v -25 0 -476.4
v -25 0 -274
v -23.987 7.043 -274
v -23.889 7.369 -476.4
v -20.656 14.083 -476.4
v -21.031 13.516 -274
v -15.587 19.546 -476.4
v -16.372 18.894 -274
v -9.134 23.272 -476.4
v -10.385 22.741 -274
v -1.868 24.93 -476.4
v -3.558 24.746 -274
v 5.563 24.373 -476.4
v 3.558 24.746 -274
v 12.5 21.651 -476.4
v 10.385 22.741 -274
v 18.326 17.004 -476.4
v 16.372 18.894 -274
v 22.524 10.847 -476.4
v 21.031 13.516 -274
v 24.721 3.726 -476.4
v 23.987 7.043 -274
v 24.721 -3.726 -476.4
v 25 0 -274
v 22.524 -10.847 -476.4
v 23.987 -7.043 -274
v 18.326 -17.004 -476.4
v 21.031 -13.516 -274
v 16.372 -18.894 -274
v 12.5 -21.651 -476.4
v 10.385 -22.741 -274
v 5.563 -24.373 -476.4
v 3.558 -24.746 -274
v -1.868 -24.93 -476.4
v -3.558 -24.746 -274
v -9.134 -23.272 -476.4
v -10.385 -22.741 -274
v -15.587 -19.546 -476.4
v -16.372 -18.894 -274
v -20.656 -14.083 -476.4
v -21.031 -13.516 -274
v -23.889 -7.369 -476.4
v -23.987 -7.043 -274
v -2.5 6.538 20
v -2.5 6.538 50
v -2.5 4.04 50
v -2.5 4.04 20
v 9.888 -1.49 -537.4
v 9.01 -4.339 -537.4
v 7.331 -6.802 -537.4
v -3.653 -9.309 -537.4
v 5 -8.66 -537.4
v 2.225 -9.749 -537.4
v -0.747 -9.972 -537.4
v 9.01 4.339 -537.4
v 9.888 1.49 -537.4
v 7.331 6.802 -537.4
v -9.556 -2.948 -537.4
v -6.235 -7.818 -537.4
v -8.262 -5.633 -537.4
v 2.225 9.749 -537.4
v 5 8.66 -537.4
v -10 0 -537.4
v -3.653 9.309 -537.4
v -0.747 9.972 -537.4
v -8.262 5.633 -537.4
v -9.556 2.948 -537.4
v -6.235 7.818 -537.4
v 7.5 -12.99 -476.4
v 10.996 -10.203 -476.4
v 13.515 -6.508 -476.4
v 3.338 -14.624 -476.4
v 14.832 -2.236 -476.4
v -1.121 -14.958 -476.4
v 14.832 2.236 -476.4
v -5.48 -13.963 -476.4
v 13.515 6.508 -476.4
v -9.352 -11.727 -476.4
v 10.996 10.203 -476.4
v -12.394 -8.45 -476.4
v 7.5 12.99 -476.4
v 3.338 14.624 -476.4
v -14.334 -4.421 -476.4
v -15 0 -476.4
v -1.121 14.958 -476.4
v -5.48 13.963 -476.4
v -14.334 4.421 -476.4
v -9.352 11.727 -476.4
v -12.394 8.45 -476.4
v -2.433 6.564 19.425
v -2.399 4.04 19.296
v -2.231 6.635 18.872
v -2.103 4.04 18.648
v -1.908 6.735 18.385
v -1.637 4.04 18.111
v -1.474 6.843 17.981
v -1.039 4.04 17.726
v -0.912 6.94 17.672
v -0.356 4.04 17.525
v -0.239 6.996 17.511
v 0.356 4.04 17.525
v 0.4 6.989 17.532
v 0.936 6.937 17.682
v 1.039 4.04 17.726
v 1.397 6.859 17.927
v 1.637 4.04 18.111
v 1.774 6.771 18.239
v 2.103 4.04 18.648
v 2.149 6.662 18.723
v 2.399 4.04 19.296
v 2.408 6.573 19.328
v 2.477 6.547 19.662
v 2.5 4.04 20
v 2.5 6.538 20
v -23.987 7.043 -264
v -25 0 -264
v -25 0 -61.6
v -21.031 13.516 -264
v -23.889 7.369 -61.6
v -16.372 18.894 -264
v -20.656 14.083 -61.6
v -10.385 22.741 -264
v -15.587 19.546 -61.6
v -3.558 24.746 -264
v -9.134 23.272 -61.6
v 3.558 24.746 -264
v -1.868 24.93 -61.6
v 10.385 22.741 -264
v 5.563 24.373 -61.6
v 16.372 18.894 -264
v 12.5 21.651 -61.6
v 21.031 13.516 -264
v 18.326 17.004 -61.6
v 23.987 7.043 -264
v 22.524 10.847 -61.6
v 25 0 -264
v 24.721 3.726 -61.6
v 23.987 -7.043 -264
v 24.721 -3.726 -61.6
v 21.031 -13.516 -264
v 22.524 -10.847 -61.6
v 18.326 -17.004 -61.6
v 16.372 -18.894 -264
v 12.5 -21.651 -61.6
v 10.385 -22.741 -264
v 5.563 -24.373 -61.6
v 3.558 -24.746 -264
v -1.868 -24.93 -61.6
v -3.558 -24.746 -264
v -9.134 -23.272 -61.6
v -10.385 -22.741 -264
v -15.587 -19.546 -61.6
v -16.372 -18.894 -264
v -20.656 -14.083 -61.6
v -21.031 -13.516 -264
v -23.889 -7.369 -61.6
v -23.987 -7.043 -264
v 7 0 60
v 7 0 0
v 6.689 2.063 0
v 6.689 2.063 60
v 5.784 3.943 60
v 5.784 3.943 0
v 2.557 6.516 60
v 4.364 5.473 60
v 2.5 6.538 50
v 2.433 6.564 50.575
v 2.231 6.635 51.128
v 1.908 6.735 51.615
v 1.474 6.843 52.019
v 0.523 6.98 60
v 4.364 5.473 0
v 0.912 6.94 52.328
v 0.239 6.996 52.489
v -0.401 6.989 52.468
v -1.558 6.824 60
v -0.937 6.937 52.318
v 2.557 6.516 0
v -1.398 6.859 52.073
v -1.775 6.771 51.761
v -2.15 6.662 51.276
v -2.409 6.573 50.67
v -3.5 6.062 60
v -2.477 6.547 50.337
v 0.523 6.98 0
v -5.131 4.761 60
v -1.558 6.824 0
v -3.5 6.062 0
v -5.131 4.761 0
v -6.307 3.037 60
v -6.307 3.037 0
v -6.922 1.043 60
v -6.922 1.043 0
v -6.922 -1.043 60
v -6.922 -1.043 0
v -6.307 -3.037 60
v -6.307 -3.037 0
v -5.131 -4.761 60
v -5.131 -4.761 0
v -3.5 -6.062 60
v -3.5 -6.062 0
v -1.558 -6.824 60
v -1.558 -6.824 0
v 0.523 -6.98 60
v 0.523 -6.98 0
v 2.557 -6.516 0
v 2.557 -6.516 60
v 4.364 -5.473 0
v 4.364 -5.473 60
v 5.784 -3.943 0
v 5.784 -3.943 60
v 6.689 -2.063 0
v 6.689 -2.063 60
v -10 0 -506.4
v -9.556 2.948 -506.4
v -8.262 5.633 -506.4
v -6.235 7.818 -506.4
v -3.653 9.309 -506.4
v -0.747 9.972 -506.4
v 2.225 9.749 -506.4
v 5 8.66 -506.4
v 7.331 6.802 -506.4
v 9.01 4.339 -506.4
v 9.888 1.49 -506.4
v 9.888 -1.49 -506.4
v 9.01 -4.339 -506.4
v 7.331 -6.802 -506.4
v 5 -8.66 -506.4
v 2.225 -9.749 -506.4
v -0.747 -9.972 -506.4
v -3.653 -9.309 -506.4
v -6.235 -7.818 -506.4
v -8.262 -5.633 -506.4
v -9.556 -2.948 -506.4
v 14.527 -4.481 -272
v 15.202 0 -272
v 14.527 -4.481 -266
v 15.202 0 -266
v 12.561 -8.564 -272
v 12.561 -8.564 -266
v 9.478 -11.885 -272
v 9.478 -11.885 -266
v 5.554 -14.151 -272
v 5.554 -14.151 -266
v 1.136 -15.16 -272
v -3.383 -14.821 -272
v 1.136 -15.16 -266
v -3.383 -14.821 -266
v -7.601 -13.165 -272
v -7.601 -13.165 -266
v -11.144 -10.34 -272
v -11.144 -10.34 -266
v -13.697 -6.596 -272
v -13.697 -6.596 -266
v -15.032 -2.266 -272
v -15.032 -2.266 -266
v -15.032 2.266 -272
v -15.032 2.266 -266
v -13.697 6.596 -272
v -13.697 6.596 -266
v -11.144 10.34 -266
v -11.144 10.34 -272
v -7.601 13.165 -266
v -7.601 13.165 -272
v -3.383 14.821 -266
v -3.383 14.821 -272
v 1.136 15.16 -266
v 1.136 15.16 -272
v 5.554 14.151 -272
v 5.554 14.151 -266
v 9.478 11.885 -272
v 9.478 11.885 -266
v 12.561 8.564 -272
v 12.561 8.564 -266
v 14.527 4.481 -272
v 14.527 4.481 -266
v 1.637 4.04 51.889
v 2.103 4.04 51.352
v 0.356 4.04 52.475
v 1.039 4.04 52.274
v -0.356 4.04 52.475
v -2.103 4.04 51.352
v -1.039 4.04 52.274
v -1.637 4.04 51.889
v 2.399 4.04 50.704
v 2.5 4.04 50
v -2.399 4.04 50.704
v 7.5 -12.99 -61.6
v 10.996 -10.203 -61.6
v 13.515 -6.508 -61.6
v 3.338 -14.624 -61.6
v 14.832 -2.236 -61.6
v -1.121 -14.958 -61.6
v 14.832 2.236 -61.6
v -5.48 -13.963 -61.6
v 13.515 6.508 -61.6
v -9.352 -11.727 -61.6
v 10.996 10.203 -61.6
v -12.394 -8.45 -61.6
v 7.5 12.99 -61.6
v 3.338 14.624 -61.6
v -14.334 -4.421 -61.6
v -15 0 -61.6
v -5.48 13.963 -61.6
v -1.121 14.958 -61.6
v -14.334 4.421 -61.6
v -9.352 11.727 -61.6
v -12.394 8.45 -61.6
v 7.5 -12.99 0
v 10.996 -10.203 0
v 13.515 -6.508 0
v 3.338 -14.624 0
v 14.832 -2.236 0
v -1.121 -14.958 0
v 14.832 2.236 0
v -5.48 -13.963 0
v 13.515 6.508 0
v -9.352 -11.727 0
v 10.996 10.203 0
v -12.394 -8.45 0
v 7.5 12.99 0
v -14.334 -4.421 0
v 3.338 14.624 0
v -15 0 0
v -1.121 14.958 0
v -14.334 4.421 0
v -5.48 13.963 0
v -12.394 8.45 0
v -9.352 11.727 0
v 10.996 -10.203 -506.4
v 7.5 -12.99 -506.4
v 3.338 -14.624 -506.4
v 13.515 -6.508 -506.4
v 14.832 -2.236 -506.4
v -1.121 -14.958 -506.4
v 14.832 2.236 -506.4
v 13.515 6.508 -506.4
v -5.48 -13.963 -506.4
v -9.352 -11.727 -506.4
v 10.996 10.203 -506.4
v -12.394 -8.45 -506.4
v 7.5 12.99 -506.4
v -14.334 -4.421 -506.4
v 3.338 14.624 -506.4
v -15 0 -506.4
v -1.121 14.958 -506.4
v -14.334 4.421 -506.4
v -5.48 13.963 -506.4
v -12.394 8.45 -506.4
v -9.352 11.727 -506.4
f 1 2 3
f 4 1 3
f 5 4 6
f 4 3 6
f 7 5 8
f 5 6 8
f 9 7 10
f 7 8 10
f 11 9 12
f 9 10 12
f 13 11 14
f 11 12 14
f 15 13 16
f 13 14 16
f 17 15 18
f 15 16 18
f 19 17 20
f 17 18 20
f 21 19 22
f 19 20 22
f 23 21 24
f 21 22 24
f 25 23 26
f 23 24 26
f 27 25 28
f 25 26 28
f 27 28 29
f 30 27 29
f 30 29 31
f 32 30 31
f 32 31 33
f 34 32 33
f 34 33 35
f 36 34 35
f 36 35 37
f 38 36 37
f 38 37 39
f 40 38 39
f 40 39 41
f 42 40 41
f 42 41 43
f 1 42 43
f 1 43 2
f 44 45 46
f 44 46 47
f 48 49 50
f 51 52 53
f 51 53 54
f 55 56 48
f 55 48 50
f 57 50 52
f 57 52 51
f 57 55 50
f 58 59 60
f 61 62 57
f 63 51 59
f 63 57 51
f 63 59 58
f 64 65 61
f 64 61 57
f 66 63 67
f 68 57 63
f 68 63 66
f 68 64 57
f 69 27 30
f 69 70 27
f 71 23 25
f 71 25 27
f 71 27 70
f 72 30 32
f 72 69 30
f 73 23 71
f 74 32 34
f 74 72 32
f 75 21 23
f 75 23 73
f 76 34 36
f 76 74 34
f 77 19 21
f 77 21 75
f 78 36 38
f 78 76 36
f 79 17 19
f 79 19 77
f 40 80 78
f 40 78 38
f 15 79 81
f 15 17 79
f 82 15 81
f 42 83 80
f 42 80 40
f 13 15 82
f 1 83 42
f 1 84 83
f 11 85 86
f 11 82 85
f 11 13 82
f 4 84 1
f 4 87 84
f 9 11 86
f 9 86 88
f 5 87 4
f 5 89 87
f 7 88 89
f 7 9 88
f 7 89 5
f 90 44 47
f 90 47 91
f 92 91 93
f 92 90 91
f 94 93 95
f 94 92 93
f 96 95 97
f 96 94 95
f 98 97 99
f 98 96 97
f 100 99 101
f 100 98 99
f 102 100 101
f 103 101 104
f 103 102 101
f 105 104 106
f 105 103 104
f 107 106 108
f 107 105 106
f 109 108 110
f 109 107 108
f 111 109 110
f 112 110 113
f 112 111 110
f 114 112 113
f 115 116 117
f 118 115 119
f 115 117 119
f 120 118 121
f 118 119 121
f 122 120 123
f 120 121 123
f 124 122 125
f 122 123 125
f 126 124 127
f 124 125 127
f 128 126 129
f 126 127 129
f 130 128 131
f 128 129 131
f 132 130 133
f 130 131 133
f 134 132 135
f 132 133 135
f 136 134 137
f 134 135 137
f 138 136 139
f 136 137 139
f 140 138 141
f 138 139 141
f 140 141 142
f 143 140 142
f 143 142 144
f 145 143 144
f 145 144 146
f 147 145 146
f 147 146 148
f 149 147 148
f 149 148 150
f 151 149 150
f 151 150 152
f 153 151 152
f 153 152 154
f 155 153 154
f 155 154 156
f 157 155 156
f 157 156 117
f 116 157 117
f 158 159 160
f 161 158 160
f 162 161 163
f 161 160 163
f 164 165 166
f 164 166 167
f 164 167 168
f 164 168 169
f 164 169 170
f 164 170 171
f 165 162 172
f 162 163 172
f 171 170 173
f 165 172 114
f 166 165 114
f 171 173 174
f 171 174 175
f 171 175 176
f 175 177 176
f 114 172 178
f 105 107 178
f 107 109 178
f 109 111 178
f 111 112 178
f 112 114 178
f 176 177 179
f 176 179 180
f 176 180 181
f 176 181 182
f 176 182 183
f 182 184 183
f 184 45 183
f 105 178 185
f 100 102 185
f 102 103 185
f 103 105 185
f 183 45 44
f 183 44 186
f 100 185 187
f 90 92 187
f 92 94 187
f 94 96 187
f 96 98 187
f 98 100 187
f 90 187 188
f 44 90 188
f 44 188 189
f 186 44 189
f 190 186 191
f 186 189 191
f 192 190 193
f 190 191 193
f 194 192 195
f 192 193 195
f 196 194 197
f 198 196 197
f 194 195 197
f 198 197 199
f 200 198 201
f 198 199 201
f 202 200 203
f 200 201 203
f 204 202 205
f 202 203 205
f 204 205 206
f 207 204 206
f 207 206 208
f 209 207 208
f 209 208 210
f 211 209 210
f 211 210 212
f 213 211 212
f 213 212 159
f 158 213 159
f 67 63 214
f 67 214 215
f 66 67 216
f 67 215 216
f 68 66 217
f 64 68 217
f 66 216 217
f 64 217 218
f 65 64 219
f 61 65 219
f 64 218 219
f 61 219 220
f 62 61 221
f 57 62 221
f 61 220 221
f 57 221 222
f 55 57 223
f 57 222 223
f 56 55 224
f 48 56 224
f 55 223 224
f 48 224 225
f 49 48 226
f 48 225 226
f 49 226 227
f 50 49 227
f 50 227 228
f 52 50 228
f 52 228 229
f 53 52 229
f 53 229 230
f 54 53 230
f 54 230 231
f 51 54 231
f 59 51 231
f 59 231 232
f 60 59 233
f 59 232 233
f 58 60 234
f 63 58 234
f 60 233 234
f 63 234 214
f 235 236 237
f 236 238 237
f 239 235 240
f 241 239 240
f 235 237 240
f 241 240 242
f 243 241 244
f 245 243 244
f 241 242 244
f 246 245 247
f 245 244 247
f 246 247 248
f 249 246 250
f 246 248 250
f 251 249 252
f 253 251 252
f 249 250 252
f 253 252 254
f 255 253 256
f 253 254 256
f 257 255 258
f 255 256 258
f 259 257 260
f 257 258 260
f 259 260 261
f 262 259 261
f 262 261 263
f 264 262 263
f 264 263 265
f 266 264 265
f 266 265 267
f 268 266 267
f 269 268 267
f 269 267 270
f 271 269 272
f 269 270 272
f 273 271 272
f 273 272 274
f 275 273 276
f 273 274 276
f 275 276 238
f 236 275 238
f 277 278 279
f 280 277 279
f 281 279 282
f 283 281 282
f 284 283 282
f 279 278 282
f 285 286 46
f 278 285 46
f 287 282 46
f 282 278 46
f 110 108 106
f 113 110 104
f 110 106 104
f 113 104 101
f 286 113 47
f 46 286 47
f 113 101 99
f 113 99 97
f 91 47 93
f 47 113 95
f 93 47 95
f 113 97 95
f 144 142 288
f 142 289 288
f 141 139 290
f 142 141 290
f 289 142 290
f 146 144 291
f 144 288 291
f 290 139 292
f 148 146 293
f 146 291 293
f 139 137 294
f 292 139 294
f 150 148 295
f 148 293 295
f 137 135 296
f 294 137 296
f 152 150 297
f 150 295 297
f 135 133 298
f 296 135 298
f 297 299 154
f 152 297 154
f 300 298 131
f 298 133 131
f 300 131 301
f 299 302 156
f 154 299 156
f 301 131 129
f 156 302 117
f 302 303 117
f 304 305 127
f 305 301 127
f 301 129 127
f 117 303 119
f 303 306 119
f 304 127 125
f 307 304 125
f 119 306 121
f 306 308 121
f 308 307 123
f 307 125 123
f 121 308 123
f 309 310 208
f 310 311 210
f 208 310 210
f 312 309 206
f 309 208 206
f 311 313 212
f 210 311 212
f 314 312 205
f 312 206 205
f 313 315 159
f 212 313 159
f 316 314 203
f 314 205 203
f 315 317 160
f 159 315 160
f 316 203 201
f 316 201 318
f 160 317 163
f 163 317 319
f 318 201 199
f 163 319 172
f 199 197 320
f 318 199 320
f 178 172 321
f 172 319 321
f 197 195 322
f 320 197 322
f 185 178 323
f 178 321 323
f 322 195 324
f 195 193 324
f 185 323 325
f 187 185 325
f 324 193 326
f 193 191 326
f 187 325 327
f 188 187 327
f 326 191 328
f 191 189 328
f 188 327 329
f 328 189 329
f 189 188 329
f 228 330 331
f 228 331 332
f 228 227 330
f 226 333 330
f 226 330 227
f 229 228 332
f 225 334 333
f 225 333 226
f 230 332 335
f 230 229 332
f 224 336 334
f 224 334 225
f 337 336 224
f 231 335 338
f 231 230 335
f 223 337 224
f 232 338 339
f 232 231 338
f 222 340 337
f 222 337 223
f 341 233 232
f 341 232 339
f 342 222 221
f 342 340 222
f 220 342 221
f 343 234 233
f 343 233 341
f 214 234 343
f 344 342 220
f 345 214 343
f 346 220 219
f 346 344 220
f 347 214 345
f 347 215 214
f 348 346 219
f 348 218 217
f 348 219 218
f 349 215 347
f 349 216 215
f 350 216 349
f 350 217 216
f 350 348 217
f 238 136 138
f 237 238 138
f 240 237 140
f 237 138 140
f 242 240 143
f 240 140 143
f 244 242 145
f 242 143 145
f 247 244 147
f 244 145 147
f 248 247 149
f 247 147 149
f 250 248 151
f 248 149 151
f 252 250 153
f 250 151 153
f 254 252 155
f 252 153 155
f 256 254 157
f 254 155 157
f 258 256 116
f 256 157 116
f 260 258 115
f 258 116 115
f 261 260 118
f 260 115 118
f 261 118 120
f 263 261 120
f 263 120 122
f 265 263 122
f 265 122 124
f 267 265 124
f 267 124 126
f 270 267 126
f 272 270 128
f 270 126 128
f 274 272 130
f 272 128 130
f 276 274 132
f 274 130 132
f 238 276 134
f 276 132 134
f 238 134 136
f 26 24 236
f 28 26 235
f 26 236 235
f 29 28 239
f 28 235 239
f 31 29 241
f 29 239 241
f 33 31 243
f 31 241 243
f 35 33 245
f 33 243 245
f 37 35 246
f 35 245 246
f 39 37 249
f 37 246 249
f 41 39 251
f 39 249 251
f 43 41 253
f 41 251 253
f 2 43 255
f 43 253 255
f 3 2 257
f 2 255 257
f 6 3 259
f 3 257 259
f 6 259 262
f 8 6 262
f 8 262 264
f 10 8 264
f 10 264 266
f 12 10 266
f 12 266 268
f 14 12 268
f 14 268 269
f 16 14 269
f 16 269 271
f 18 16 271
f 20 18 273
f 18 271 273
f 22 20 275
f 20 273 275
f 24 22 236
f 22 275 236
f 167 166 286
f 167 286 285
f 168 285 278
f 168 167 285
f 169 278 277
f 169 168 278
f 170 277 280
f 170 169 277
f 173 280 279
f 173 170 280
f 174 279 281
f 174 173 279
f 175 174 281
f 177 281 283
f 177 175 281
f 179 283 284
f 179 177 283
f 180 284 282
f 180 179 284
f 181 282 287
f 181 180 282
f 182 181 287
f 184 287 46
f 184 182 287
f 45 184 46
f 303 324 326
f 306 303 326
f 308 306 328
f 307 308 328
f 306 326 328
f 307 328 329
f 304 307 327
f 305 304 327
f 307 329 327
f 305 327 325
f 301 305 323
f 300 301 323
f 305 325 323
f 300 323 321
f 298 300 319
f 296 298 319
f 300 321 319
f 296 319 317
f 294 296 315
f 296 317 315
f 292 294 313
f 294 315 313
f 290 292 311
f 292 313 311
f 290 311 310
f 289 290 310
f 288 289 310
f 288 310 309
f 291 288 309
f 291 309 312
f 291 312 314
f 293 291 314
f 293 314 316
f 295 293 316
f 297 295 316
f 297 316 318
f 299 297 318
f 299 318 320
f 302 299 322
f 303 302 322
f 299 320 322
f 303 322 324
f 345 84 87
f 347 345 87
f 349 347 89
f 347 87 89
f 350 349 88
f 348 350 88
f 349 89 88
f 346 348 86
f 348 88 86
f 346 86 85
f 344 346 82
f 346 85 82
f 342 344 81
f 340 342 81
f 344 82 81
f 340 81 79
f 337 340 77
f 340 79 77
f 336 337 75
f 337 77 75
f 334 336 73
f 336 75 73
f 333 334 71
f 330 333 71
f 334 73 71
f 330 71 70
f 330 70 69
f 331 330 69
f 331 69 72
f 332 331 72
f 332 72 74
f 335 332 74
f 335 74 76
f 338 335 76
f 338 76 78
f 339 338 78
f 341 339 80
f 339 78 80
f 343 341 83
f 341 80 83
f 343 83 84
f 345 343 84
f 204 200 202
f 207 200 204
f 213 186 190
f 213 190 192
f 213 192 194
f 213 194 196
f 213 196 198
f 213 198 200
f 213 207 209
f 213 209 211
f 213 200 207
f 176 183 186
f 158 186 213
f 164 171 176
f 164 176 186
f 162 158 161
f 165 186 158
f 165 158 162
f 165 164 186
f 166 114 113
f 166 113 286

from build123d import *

# Parameters (mm, degrees)
ESQUISSE1_R             = 7
BOSS_EXTRU_1_DEPTH      = 60
ESQUISSE2_R             = 15
BOSS_EXTRU_2_DEPTH      = 61.6
ESQUISSE3_R             = 25
BOSS_EXTRU_3_DEPTH      = 414.8
ESQUISSE4_R             = 15
BOSS_EXTRU_4_DEPTH      = 30
ESQUISSE5_R             = 10
BOSS_EXTRU_5_DEPTH      = 31
ENL_V_MAT_EXTRU_1_DEPTH = 2.96


with BuildPart() as part:
    # Esquisse1 → Boss.-Extru.1 (new body)
    with BuildSketch(Plane.XY):
        Circle(ESQUISSE1_R)
    extrude(amount=BOSS_EXTRU_1_DEPTH)

    # Esquisse2 → Boss.-Extru.2 (add)
    with BuildSketch(Plane(origin=(0, 0, 0), x_dir=(-1, 0, 0), z_dir=(0, 0, -1))):
        Circle(ESQUISSE2_R)
    extrude(amount=BOSS_EXTRU_2_DEPTH)

    # Esquisse3 → Boss.-Extru.3 (add)
    with BuildSketch(Plane(origin=(0, 0, -61.6), x_dir=(-1, 0, 0), z_dir=(0, 0, -1))):
        Circle(ESQUISSE3_R)
    extrude(amount=BOSS_EXTRU_3_DEPTH)

    # Esquisse4 → Boss.-Extru.4 (add)
    with BuildSketch(Plane(origin=(0, 0, -476.4), x_dir=(-1, 0, 0), z_dir=(0, 0, -1))):
        Circle(ESQUISSE4_R)
    extrude(amount=BOSS_EXTRU_4_DEPTH)

    # Esquisse5 → Boss.-Extru.5 (add)
    with BuildSketch(Plane(origin=(0, 0, -506.4), x_dir=(-1, 0, 0), z_dir=(0, 0, -1))):
        Circle(ESQUISSE5_R)
    extrude(amount=BOSS_EXTRU_5_DEPTH)

    # Esquisse7 → Enlèv. mat.-Extru.1 (cut)
    with BuildSketch(Plane(origin=(0, 7, 0), x_dir=(1, 0, 0), z_dir=(0, 1, 0))):
        with BuildLine():
            Line((-2.5, -50), (-2.5, -20))
            ThreePointArc((-2.5, -20), (0, -17.5), (2.5, -20))
            Line((2.5, -20), (2.5, -50))
            ThreePointArc((2.5, -50), (0, -52.5), (-2.5, -50))
        make_face()
    extrude(amount=-ENL_V_MAT_EXTRU_1_DEPTH, mode=Mode.SUBTRACT)

    # Esquisse8 → Enlèvement de matière-Révolution1 (revolve, cut)
    with BuildSketch(Plane(origin=(0, 0, 0), x_dir=(0, 0, -1), z_dir=(1, 0, 0)), mode=Mode.PRIVATE) as enl_vement_de_mati_re_r_volution1_sk:
        Polygon((266, 15.202041029), (264, 25), (274, 25), (272, 15.202041029), align=None)
    revolve(enl_vement_de_mati_re_r_volution1_sk.sketch.rotate(Axis((0, 0, 0), (0, 0, -1)), 90), axis=Axis((0, 0, 0), (0, 0, -1)), mode=Mode.SUBTRACT)  # turned: the seam where the file's is


solid = part.part
